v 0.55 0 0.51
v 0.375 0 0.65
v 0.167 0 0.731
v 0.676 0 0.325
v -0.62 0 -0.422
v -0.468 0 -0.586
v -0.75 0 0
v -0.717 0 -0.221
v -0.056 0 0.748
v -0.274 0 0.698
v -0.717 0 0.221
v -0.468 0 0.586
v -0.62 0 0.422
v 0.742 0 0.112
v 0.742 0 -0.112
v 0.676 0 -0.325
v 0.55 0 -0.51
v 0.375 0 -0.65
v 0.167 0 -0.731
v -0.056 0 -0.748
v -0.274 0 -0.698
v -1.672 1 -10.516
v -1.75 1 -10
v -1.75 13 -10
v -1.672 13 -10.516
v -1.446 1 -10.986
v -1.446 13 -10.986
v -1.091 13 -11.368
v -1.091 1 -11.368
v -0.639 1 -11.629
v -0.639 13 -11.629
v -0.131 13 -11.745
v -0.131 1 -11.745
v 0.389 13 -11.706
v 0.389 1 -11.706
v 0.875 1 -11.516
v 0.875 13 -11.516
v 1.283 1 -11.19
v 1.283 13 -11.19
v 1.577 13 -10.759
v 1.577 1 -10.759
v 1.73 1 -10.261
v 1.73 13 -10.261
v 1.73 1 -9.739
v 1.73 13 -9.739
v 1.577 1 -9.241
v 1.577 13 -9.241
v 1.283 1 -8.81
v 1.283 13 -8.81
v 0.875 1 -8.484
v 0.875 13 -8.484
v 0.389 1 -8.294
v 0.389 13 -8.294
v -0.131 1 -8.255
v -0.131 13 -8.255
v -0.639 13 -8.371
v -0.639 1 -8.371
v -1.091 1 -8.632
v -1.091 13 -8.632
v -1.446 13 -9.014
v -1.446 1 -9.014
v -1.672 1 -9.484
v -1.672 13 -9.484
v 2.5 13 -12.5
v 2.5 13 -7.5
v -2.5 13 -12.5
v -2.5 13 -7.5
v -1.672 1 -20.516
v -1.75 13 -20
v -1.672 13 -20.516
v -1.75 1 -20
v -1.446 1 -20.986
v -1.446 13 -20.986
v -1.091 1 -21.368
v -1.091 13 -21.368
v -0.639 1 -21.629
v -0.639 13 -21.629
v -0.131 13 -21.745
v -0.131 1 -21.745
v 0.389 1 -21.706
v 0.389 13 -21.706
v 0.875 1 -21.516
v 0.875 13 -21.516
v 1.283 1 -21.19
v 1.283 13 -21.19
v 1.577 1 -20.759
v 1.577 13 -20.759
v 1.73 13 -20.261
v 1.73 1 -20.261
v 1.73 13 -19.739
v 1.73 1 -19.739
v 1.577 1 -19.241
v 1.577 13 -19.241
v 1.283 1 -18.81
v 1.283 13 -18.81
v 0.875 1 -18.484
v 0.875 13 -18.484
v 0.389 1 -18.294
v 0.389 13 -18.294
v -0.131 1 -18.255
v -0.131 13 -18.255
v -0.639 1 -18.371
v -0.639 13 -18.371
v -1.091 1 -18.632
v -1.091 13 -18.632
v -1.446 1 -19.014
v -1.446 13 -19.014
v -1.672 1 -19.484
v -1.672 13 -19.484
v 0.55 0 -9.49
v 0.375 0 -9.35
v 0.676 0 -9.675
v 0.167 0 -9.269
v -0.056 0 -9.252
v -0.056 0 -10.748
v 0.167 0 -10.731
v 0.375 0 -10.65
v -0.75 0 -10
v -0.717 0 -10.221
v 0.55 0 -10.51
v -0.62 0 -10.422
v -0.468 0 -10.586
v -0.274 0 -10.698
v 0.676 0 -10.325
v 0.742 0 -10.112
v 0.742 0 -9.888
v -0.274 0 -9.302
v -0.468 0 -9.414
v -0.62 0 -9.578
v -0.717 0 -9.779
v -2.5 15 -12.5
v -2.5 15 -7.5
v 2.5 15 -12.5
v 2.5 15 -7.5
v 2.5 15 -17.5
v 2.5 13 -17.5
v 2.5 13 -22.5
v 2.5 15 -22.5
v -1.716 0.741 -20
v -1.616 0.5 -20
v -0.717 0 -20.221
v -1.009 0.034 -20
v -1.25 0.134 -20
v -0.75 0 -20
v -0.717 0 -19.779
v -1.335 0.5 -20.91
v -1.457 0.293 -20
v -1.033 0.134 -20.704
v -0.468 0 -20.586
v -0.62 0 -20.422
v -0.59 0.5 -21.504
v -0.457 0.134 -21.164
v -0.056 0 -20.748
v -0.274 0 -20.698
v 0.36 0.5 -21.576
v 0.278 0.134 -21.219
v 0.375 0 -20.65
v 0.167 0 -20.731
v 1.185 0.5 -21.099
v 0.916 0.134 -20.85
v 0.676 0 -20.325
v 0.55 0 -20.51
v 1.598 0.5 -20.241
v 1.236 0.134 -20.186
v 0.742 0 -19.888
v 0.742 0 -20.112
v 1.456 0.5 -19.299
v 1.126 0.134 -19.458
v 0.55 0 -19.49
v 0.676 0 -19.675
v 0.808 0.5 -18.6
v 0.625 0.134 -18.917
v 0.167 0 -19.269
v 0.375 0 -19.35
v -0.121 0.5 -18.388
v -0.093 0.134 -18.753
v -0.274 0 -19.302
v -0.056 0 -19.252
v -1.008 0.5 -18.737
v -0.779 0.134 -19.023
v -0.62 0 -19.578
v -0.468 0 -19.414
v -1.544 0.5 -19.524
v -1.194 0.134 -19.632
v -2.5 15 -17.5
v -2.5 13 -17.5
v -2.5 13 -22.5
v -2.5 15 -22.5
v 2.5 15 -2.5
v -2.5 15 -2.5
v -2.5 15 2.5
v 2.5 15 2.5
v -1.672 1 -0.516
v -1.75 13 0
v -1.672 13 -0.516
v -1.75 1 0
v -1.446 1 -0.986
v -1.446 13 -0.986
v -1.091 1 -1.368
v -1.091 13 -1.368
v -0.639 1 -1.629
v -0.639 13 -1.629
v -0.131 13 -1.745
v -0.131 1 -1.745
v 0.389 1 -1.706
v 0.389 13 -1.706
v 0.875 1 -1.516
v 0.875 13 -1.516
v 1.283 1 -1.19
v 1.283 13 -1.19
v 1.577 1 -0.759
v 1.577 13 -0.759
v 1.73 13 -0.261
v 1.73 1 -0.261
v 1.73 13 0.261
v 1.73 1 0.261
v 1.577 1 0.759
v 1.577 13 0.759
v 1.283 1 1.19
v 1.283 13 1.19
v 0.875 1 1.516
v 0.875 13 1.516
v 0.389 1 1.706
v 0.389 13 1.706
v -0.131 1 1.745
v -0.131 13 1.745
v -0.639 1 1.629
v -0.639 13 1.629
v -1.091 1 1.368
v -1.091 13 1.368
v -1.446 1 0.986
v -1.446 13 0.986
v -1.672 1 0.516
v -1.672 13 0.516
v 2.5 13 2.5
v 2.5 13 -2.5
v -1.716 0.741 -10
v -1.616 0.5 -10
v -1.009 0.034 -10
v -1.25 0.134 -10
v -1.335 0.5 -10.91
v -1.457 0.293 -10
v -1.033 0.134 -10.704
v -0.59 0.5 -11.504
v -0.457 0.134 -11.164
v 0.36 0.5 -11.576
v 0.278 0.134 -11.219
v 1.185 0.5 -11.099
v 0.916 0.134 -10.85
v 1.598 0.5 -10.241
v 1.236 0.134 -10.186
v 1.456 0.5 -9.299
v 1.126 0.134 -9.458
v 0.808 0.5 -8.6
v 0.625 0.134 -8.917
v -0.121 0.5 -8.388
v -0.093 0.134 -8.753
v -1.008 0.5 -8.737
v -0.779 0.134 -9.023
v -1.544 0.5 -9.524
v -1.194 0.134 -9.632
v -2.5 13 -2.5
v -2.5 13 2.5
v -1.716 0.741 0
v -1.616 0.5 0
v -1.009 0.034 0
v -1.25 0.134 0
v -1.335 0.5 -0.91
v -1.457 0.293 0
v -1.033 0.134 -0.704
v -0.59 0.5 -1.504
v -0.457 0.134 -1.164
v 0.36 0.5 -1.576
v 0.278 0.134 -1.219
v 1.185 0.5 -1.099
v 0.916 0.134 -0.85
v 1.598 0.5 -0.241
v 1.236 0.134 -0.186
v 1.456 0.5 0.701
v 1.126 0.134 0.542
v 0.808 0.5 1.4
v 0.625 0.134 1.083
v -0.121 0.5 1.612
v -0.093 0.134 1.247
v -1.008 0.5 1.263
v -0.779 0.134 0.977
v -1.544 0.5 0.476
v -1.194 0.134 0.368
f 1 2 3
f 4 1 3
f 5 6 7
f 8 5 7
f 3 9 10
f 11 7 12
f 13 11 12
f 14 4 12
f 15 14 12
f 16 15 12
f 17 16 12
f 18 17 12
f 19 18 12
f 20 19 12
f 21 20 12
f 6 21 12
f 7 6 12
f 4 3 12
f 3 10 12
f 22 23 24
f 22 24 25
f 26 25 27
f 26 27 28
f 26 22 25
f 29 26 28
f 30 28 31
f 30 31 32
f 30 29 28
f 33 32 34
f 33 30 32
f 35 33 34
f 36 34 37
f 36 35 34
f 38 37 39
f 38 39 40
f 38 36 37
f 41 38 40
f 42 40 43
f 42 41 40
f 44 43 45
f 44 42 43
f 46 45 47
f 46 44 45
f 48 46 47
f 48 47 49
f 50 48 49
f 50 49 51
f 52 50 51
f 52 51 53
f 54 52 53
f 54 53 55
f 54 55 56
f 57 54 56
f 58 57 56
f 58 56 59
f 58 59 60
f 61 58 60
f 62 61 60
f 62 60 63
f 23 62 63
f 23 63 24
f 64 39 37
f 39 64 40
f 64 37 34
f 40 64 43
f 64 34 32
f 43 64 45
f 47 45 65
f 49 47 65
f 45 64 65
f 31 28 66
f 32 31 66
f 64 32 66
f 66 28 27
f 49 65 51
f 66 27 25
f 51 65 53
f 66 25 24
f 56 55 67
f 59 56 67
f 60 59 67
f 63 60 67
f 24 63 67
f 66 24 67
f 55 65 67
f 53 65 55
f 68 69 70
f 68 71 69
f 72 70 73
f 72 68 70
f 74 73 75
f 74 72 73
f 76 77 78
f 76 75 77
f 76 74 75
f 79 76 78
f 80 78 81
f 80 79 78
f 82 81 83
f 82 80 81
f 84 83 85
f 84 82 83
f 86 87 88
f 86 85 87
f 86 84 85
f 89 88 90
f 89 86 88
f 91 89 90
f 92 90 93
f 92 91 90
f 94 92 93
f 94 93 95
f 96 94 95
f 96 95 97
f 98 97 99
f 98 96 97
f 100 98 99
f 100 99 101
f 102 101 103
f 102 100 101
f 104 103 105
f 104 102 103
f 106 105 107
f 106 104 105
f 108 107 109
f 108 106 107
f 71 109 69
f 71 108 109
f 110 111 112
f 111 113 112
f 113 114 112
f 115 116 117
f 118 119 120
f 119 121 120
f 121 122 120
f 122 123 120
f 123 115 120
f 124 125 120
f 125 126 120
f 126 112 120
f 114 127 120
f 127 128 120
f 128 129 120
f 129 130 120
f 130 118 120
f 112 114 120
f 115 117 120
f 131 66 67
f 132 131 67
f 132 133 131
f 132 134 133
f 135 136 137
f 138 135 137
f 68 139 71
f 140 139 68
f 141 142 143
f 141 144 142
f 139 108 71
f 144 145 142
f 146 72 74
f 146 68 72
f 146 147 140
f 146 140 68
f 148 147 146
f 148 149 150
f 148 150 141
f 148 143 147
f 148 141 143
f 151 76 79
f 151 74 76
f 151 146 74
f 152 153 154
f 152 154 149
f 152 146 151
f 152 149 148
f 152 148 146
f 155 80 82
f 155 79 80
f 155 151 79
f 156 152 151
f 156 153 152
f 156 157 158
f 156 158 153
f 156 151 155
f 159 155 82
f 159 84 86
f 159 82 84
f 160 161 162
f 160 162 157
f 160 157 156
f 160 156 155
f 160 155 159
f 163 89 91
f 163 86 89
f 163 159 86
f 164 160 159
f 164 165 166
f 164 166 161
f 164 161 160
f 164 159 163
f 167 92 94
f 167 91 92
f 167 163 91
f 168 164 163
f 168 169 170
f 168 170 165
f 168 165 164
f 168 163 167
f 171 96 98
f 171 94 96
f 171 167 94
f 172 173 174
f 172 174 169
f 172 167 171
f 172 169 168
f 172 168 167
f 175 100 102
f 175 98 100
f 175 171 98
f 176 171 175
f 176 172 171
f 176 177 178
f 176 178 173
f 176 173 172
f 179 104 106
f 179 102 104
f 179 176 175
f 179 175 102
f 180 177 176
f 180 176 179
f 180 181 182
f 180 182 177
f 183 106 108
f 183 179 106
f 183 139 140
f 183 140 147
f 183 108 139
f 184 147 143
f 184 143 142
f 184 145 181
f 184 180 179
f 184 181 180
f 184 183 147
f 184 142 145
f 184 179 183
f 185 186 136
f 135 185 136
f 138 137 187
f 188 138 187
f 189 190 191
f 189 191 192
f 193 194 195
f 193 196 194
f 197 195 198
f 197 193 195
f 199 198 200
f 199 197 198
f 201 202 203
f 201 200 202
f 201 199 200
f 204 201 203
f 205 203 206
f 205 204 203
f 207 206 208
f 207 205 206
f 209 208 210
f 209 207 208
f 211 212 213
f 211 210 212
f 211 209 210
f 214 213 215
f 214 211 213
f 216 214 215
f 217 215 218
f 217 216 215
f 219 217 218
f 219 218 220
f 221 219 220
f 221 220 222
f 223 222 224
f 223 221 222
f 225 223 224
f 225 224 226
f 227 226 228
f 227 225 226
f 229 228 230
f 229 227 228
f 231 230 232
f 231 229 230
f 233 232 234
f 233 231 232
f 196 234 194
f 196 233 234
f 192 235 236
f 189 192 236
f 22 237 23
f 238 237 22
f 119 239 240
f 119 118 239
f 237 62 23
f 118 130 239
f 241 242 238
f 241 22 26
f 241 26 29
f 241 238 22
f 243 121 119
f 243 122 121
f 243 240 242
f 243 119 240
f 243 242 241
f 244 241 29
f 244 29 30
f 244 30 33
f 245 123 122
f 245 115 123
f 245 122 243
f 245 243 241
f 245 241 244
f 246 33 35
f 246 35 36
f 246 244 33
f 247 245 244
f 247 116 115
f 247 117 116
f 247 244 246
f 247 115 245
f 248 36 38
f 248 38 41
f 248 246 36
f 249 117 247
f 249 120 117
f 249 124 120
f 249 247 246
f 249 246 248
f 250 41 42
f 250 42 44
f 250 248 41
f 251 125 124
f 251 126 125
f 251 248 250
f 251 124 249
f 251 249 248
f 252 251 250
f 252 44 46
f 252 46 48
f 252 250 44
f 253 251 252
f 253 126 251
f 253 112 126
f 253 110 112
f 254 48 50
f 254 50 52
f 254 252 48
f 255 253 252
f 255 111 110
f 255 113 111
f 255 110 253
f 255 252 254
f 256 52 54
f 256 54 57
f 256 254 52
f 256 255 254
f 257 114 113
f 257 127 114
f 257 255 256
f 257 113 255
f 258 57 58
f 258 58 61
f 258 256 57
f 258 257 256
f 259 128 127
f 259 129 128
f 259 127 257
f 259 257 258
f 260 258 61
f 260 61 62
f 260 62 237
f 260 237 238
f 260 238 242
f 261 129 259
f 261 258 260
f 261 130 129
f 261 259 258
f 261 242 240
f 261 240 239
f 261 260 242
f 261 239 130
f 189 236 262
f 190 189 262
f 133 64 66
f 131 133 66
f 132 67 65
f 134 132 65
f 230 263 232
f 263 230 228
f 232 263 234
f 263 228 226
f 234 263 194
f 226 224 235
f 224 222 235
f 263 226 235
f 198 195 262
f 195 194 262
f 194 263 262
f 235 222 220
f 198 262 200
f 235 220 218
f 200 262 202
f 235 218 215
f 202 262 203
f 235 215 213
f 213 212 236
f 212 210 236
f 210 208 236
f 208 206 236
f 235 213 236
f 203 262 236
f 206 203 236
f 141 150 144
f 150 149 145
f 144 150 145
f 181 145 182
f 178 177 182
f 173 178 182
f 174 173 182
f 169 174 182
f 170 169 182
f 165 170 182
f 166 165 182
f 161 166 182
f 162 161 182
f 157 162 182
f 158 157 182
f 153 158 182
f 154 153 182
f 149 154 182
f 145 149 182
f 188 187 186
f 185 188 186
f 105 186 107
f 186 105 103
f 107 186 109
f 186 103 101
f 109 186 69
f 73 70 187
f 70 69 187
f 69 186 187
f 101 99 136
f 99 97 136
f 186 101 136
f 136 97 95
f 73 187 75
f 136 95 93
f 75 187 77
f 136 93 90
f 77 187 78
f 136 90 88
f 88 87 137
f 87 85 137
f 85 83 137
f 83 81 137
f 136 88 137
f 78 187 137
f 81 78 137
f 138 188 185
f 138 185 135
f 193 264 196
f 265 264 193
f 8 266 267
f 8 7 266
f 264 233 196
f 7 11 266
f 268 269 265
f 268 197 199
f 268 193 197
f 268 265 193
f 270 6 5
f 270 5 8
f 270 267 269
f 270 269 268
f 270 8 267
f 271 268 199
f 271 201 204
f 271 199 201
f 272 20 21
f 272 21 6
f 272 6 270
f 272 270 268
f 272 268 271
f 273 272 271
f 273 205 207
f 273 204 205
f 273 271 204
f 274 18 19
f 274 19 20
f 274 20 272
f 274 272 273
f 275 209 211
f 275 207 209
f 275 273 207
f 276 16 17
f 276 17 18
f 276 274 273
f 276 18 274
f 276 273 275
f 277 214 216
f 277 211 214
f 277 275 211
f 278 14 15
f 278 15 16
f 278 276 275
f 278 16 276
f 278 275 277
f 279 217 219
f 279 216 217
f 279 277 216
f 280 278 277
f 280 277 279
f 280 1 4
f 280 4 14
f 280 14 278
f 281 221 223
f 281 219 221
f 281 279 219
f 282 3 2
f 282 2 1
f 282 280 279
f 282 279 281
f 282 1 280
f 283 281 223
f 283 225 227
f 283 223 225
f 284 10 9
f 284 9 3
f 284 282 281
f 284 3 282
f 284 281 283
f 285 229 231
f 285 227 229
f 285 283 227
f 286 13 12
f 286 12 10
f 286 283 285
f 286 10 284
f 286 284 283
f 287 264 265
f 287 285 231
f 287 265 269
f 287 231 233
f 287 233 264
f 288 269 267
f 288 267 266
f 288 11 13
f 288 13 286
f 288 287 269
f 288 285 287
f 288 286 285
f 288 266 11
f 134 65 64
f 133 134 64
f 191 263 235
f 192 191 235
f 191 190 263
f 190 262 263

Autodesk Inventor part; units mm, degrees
ref_plane "YZ Plane" through (0, 0, 0) normal (1, 0, 0) x (0, 1, 0)
ref_plane "XZ Plane" through (0, 0, 0) normal (0, 1, 0) x (-1, 0, 0)
ref_plane "XY Plane" through (0, 0, 0) normal (0, 0, 1) x (1, 0, 0)
sketch "Sketch1" plane through (0, 0, 0) normal (0, 1, 0) x (-1, 0, 0)
  circle A0 centre (0, 0) radius 1.75
  dimension "d1" = 3.5
  dimension "d5" = 0
extrude "Extrusion1" add sketch "Sketch1" along normal blind 13
sketch "Sketch5" plane through (0, 13, 0) normal (0, 1, 0) x (1, 0, 0)
  circle A0 centre (0, 0) radius 1.75 projected
  line L0 (-2.5, -2.5) -> (2.5, -2.5)
  line L1 (2.5, -2.5) -> (2.5, 2.5)
  line L2 (2.5, 2.5) -> (-2.5, 2.5)
  line L3 (-2.5, 2.5) -> (-2.5, -2.5)
  line L4 (-2.5, -2.5) -> (2.5, 2.5) construction
  line L5 (2.5, -2.5) -> (-2.5, 2.5) construction
  dimension "d14" = 5
  dimension "d15" = 5
extrude "Extrusion2" add sketch "Sketch5" along normal blind 2 contours A0 | L3 L2 L1 L0
sketch "Sketch6" plane through (0, 0, 0) normal (0, 1, 0) x (-1, 0, 0)
  point P0 (0, 0)
ref_plane "Work Plane1" through (2.5, 13, -5) normal (0, 0, -1) x (-1, 0, 0)
mirror "Mirror1" about plane through (2.5, 13, -5) normal (0, 0, -1)
ref_plane "Work Plane2" through (2.5, 13, -15) normal (0, 0, -1) x (-1, 0, 0)
mirror "Mirror2" about plane through (2.5, 13, -15) normal (0, 0, -1) of "Mirror1"
fillet "Fillet1" radius 1 3 edges at (1.75, 0, 0) (1.75, 0, -10) (1.75, 0, -20)
equation "\"d1\" = d0"
equation "\"d15\" = d14"
equation "\"d0\" = 3.5"
